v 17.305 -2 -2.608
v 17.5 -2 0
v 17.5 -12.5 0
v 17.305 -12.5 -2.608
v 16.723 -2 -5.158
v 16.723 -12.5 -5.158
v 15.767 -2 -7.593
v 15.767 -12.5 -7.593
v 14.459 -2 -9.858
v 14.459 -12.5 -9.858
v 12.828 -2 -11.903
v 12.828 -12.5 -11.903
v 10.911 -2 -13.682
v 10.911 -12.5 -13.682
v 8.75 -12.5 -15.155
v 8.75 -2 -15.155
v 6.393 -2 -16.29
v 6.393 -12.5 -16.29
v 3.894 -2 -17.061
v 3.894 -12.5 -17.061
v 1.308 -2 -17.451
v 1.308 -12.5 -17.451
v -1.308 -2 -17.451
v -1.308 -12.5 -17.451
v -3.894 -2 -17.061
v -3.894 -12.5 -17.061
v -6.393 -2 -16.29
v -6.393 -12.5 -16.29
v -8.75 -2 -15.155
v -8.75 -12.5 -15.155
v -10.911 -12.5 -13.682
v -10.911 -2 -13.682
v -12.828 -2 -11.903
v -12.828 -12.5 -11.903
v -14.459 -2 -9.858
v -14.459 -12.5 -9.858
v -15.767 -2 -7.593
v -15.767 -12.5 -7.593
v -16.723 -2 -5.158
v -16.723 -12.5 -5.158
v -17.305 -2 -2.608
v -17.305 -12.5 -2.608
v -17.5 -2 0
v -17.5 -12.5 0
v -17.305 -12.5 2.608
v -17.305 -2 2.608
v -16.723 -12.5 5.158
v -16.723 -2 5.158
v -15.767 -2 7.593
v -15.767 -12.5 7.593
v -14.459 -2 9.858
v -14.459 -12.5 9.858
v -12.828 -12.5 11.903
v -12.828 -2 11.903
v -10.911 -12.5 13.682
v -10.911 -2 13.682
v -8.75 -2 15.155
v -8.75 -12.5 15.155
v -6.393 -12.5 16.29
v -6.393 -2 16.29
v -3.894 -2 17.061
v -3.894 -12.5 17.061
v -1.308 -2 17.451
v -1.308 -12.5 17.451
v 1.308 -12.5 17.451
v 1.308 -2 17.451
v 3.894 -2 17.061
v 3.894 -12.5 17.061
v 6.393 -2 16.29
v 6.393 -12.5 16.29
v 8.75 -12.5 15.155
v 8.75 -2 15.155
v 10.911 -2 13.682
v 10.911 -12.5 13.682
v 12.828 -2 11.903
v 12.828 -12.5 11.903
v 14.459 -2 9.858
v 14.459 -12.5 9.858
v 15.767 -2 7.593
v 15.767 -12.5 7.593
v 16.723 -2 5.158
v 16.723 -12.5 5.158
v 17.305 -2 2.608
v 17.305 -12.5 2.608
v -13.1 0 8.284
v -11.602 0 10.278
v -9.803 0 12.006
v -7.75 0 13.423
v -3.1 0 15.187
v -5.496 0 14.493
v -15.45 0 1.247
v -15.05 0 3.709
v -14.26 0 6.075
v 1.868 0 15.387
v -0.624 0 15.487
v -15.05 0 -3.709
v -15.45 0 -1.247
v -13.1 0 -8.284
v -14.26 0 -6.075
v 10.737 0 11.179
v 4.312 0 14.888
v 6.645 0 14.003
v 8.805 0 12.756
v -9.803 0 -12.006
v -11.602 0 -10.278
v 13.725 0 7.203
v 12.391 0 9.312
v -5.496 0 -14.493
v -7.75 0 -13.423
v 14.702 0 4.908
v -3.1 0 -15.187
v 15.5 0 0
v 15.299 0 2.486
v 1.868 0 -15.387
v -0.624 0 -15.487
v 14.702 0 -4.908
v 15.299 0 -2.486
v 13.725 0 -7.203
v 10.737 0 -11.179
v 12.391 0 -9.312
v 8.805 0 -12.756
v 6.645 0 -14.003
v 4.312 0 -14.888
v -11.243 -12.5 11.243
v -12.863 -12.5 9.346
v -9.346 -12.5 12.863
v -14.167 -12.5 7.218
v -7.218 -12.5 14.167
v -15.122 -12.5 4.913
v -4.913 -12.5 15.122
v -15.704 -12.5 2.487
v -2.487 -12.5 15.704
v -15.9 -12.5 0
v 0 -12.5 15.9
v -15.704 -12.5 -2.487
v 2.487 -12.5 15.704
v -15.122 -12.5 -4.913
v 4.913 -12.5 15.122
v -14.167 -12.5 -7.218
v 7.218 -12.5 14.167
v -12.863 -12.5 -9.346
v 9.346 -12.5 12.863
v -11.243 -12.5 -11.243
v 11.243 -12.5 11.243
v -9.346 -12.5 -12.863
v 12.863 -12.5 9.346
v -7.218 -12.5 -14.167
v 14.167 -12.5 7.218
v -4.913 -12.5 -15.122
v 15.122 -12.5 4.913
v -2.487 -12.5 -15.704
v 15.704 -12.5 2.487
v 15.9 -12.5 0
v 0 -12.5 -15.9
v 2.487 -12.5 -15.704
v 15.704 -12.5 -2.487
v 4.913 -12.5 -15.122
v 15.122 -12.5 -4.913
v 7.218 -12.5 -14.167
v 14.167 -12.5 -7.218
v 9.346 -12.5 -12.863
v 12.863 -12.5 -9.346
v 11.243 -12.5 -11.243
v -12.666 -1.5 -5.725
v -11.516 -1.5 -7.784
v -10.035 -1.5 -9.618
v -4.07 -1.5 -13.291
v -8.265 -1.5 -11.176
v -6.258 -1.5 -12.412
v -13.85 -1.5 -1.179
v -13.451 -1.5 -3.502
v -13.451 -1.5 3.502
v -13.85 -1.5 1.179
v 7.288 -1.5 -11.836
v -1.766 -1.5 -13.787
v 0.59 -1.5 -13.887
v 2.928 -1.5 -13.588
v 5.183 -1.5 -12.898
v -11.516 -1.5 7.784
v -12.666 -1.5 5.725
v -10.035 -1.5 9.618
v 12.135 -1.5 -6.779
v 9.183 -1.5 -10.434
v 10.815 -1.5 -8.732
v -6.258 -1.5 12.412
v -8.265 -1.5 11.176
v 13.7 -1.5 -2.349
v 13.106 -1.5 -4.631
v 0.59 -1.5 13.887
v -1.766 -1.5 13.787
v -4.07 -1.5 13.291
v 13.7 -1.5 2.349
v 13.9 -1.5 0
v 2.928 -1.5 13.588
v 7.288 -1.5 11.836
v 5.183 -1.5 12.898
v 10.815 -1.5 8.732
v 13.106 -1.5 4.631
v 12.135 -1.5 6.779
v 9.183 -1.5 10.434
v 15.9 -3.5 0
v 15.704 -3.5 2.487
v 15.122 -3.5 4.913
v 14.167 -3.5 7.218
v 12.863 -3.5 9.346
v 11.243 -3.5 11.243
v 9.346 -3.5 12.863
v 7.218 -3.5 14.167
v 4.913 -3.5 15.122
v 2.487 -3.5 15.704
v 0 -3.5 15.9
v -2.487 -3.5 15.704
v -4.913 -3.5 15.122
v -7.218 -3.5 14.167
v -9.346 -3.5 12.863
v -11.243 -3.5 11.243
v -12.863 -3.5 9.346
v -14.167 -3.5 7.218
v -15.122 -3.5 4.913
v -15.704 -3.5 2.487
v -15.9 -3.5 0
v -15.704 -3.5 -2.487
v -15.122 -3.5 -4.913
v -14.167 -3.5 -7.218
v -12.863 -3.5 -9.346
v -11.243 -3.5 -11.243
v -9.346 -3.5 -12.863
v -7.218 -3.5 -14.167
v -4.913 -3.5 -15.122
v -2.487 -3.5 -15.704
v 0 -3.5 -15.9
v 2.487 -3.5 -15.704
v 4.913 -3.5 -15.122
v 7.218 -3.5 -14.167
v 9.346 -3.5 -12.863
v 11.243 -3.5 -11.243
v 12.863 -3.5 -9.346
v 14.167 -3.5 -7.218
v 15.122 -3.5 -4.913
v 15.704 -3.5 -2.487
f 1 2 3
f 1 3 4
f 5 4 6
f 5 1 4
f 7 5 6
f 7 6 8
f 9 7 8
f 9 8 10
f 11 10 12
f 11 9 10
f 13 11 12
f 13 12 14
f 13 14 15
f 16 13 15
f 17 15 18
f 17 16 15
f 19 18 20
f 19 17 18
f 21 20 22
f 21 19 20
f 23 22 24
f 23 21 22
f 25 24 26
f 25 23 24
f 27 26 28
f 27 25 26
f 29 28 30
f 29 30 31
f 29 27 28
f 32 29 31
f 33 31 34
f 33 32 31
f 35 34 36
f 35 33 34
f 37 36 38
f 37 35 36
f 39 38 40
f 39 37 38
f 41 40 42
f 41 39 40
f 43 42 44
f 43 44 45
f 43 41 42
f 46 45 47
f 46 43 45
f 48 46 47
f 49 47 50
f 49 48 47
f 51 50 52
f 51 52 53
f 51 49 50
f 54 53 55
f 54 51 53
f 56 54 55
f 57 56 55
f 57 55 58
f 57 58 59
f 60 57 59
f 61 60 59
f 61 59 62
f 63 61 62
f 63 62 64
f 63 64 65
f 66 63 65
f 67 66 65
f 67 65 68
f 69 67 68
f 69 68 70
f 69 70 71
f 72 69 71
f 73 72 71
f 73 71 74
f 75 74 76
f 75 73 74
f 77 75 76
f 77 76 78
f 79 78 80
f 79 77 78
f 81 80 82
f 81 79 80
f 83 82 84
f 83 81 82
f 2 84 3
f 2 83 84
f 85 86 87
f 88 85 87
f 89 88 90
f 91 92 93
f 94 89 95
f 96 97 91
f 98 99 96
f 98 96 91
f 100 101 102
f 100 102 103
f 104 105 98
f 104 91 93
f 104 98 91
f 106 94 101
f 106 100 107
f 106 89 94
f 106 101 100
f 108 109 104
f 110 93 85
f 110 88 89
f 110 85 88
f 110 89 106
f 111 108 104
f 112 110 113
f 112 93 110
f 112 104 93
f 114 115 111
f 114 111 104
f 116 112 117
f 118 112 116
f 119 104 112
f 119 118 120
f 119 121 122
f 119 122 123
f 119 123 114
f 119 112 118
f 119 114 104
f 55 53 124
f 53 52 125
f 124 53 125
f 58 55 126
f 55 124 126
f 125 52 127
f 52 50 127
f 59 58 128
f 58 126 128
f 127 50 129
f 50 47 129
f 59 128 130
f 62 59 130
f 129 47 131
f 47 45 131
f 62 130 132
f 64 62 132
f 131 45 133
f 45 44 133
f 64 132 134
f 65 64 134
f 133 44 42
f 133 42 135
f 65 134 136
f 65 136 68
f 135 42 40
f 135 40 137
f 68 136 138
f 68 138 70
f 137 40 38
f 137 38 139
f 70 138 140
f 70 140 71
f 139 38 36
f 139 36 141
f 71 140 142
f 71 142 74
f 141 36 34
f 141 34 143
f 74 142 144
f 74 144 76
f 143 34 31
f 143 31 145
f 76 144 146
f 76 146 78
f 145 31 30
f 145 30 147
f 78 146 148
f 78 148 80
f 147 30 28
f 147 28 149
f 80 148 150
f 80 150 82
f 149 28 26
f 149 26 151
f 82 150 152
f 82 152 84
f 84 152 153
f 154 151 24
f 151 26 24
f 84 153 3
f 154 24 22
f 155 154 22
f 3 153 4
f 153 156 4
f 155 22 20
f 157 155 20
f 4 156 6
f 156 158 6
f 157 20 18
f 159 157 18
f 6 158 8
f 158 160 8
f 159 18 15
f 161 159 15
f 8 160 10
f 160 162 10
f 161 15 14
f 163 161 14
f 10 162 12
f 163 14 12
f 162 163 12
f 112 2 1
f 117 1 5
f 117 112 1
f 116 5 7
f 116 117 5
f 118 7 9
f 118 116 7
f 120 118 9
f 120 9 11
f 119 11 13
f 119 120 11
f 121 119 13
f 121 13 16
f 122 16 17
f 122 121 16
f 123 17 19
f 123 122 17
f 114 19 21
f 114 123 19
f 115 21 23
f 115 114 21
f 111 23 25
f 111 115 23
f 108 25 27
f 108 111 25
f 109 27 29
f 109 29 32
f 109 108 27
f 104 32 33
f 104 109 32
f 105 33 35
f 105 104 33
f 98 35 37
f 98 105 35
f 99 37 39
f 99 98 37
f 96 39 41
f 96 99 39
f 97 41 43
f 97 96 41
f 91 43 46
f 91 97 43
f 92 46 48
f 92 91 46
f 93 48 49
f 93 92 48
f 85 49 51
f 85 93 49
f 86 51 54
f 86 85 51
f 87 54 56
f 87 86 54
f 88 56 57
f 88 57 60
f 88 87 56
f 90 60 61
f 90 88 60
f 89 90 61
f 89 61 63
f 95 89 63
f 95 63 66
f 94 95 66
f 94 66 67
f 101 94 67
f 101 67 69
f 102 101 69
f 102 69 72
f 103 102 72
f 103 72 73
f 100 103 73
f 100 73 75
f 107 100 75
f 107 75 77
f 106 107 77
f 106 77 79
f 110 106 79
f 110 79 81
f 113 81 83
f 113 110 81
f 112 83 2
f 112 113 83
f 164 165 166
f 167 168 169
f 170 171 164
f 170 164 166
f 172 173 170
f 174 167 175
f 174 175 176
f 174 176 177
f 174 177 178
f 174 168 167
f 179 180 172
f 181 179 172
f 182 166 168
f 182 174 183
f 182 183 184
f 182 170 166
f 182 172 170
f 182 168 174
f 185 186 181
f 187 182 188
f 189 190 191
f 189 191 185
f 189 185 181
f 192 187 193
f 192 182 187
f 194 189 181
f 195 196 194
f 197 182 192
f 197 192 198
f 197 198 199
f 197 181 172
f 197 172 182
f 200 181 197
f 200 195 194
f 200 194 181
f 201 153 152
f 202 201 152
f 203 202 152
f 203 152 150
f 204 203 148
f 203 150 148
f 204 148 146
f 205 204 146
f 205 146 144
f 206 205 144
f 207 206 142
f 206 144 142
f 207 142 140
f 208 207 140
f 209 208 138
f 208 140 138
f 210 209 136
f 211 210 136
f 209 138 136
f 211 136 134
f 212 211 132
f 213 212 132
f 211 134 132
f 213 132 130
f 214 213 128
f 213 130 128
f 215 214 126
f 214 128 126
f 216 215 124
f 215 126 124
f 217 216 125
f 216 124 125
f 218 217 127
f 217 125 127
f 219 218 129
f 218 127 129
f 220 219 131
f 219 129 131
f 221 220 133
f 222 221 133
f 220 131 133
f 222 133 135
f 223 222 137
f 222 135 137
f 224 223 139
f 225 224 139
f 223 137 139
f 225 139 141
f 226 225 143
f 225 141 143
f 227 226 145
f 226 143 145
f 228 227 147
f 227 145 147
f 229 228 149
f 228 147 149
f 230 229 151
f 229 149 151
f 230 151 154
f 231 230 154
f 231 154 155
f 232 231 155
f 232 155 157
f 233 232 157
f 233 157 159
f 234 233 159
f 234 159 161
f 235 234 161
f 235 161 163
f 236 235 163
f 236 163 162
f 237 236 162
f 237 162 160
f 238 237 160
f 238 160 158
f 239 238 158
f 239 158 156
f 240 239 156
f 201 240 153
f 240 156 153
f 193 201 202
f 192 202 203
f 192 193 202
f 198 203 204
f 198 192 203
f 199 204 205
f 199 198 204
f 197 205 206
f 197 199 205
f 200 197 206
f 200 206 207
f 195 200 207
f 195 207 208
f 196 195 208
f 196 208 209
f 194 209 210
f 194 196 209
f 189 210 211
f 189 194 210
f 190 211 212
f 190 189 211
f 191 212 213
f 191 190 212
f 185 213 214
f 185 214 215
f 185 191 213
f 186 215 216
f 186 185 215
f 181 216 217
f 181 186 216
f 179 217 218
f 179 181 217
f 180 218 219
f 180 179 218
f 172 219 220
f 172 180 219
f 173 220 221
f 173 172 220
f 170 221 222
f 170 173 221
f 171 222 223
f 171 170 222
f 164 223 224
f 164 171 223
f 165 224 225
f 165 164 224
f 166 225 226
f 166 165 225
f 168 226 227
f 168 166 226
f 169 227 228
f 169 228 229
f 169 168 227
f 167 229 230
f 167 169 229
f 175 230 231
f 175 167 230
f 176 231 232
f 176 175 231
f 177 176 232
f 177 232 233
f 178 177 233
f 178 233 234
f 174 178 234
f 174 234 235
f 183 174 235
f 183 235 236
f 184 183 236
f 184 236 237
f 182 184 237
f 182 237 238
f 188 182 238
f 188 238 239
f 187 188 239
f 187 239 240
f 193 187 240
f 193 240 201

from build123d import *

# Parameters (mm, degrees)
SKETCH1_R           = 17.5
BOSS_EXTRUDE1_DEPTH = 12.5
SKETCH2_R           = 15.9
CUT_EXTRUDE1_DEPTH  = 11
CHAMFER1_SIZE       = 2
CHAMFER2_SIZE       = 2


with BuildPart() as part:
    # Sketch1 → Boss-Extrude1 (new body)
    with BuildSketch(Plane(origin=(0, 0, 0), x_dir=(1, 0, 0), z_dir=(0, 1, 0))):
        Circle(SKETCH1_R)
    extrude(amount=-BOSS_EXTRUDE1_DEPTH)

    # Sketch2 → Cut-Extrude1 (cut)
    with BuildSketch(Plane.XZ.offset(12.5)):
        Circle(SKETCH2_R)
    extrude(amount=-CUT_EXTRUDE1_DEPTH, mode=Mode.SUBTRACT)

    # Chamfer1
    chamfer1_edges = [part.edges().sort_by_distance(p)[0] for p in [
        (-17.5, 0, 0),
    ]]
    chamfer(chamfer1_edges, length=CHAMFER1_SIZE)

    # Chamfer2
    chamfer2_edges = [part.edges().sort_by_distance(p)[0] for p in [
        (-15.9, -1.5, 0),
    ]]
    chamfer(chamfer2_edges, length=CHAMFER2_SIZE)


solid = part.part
